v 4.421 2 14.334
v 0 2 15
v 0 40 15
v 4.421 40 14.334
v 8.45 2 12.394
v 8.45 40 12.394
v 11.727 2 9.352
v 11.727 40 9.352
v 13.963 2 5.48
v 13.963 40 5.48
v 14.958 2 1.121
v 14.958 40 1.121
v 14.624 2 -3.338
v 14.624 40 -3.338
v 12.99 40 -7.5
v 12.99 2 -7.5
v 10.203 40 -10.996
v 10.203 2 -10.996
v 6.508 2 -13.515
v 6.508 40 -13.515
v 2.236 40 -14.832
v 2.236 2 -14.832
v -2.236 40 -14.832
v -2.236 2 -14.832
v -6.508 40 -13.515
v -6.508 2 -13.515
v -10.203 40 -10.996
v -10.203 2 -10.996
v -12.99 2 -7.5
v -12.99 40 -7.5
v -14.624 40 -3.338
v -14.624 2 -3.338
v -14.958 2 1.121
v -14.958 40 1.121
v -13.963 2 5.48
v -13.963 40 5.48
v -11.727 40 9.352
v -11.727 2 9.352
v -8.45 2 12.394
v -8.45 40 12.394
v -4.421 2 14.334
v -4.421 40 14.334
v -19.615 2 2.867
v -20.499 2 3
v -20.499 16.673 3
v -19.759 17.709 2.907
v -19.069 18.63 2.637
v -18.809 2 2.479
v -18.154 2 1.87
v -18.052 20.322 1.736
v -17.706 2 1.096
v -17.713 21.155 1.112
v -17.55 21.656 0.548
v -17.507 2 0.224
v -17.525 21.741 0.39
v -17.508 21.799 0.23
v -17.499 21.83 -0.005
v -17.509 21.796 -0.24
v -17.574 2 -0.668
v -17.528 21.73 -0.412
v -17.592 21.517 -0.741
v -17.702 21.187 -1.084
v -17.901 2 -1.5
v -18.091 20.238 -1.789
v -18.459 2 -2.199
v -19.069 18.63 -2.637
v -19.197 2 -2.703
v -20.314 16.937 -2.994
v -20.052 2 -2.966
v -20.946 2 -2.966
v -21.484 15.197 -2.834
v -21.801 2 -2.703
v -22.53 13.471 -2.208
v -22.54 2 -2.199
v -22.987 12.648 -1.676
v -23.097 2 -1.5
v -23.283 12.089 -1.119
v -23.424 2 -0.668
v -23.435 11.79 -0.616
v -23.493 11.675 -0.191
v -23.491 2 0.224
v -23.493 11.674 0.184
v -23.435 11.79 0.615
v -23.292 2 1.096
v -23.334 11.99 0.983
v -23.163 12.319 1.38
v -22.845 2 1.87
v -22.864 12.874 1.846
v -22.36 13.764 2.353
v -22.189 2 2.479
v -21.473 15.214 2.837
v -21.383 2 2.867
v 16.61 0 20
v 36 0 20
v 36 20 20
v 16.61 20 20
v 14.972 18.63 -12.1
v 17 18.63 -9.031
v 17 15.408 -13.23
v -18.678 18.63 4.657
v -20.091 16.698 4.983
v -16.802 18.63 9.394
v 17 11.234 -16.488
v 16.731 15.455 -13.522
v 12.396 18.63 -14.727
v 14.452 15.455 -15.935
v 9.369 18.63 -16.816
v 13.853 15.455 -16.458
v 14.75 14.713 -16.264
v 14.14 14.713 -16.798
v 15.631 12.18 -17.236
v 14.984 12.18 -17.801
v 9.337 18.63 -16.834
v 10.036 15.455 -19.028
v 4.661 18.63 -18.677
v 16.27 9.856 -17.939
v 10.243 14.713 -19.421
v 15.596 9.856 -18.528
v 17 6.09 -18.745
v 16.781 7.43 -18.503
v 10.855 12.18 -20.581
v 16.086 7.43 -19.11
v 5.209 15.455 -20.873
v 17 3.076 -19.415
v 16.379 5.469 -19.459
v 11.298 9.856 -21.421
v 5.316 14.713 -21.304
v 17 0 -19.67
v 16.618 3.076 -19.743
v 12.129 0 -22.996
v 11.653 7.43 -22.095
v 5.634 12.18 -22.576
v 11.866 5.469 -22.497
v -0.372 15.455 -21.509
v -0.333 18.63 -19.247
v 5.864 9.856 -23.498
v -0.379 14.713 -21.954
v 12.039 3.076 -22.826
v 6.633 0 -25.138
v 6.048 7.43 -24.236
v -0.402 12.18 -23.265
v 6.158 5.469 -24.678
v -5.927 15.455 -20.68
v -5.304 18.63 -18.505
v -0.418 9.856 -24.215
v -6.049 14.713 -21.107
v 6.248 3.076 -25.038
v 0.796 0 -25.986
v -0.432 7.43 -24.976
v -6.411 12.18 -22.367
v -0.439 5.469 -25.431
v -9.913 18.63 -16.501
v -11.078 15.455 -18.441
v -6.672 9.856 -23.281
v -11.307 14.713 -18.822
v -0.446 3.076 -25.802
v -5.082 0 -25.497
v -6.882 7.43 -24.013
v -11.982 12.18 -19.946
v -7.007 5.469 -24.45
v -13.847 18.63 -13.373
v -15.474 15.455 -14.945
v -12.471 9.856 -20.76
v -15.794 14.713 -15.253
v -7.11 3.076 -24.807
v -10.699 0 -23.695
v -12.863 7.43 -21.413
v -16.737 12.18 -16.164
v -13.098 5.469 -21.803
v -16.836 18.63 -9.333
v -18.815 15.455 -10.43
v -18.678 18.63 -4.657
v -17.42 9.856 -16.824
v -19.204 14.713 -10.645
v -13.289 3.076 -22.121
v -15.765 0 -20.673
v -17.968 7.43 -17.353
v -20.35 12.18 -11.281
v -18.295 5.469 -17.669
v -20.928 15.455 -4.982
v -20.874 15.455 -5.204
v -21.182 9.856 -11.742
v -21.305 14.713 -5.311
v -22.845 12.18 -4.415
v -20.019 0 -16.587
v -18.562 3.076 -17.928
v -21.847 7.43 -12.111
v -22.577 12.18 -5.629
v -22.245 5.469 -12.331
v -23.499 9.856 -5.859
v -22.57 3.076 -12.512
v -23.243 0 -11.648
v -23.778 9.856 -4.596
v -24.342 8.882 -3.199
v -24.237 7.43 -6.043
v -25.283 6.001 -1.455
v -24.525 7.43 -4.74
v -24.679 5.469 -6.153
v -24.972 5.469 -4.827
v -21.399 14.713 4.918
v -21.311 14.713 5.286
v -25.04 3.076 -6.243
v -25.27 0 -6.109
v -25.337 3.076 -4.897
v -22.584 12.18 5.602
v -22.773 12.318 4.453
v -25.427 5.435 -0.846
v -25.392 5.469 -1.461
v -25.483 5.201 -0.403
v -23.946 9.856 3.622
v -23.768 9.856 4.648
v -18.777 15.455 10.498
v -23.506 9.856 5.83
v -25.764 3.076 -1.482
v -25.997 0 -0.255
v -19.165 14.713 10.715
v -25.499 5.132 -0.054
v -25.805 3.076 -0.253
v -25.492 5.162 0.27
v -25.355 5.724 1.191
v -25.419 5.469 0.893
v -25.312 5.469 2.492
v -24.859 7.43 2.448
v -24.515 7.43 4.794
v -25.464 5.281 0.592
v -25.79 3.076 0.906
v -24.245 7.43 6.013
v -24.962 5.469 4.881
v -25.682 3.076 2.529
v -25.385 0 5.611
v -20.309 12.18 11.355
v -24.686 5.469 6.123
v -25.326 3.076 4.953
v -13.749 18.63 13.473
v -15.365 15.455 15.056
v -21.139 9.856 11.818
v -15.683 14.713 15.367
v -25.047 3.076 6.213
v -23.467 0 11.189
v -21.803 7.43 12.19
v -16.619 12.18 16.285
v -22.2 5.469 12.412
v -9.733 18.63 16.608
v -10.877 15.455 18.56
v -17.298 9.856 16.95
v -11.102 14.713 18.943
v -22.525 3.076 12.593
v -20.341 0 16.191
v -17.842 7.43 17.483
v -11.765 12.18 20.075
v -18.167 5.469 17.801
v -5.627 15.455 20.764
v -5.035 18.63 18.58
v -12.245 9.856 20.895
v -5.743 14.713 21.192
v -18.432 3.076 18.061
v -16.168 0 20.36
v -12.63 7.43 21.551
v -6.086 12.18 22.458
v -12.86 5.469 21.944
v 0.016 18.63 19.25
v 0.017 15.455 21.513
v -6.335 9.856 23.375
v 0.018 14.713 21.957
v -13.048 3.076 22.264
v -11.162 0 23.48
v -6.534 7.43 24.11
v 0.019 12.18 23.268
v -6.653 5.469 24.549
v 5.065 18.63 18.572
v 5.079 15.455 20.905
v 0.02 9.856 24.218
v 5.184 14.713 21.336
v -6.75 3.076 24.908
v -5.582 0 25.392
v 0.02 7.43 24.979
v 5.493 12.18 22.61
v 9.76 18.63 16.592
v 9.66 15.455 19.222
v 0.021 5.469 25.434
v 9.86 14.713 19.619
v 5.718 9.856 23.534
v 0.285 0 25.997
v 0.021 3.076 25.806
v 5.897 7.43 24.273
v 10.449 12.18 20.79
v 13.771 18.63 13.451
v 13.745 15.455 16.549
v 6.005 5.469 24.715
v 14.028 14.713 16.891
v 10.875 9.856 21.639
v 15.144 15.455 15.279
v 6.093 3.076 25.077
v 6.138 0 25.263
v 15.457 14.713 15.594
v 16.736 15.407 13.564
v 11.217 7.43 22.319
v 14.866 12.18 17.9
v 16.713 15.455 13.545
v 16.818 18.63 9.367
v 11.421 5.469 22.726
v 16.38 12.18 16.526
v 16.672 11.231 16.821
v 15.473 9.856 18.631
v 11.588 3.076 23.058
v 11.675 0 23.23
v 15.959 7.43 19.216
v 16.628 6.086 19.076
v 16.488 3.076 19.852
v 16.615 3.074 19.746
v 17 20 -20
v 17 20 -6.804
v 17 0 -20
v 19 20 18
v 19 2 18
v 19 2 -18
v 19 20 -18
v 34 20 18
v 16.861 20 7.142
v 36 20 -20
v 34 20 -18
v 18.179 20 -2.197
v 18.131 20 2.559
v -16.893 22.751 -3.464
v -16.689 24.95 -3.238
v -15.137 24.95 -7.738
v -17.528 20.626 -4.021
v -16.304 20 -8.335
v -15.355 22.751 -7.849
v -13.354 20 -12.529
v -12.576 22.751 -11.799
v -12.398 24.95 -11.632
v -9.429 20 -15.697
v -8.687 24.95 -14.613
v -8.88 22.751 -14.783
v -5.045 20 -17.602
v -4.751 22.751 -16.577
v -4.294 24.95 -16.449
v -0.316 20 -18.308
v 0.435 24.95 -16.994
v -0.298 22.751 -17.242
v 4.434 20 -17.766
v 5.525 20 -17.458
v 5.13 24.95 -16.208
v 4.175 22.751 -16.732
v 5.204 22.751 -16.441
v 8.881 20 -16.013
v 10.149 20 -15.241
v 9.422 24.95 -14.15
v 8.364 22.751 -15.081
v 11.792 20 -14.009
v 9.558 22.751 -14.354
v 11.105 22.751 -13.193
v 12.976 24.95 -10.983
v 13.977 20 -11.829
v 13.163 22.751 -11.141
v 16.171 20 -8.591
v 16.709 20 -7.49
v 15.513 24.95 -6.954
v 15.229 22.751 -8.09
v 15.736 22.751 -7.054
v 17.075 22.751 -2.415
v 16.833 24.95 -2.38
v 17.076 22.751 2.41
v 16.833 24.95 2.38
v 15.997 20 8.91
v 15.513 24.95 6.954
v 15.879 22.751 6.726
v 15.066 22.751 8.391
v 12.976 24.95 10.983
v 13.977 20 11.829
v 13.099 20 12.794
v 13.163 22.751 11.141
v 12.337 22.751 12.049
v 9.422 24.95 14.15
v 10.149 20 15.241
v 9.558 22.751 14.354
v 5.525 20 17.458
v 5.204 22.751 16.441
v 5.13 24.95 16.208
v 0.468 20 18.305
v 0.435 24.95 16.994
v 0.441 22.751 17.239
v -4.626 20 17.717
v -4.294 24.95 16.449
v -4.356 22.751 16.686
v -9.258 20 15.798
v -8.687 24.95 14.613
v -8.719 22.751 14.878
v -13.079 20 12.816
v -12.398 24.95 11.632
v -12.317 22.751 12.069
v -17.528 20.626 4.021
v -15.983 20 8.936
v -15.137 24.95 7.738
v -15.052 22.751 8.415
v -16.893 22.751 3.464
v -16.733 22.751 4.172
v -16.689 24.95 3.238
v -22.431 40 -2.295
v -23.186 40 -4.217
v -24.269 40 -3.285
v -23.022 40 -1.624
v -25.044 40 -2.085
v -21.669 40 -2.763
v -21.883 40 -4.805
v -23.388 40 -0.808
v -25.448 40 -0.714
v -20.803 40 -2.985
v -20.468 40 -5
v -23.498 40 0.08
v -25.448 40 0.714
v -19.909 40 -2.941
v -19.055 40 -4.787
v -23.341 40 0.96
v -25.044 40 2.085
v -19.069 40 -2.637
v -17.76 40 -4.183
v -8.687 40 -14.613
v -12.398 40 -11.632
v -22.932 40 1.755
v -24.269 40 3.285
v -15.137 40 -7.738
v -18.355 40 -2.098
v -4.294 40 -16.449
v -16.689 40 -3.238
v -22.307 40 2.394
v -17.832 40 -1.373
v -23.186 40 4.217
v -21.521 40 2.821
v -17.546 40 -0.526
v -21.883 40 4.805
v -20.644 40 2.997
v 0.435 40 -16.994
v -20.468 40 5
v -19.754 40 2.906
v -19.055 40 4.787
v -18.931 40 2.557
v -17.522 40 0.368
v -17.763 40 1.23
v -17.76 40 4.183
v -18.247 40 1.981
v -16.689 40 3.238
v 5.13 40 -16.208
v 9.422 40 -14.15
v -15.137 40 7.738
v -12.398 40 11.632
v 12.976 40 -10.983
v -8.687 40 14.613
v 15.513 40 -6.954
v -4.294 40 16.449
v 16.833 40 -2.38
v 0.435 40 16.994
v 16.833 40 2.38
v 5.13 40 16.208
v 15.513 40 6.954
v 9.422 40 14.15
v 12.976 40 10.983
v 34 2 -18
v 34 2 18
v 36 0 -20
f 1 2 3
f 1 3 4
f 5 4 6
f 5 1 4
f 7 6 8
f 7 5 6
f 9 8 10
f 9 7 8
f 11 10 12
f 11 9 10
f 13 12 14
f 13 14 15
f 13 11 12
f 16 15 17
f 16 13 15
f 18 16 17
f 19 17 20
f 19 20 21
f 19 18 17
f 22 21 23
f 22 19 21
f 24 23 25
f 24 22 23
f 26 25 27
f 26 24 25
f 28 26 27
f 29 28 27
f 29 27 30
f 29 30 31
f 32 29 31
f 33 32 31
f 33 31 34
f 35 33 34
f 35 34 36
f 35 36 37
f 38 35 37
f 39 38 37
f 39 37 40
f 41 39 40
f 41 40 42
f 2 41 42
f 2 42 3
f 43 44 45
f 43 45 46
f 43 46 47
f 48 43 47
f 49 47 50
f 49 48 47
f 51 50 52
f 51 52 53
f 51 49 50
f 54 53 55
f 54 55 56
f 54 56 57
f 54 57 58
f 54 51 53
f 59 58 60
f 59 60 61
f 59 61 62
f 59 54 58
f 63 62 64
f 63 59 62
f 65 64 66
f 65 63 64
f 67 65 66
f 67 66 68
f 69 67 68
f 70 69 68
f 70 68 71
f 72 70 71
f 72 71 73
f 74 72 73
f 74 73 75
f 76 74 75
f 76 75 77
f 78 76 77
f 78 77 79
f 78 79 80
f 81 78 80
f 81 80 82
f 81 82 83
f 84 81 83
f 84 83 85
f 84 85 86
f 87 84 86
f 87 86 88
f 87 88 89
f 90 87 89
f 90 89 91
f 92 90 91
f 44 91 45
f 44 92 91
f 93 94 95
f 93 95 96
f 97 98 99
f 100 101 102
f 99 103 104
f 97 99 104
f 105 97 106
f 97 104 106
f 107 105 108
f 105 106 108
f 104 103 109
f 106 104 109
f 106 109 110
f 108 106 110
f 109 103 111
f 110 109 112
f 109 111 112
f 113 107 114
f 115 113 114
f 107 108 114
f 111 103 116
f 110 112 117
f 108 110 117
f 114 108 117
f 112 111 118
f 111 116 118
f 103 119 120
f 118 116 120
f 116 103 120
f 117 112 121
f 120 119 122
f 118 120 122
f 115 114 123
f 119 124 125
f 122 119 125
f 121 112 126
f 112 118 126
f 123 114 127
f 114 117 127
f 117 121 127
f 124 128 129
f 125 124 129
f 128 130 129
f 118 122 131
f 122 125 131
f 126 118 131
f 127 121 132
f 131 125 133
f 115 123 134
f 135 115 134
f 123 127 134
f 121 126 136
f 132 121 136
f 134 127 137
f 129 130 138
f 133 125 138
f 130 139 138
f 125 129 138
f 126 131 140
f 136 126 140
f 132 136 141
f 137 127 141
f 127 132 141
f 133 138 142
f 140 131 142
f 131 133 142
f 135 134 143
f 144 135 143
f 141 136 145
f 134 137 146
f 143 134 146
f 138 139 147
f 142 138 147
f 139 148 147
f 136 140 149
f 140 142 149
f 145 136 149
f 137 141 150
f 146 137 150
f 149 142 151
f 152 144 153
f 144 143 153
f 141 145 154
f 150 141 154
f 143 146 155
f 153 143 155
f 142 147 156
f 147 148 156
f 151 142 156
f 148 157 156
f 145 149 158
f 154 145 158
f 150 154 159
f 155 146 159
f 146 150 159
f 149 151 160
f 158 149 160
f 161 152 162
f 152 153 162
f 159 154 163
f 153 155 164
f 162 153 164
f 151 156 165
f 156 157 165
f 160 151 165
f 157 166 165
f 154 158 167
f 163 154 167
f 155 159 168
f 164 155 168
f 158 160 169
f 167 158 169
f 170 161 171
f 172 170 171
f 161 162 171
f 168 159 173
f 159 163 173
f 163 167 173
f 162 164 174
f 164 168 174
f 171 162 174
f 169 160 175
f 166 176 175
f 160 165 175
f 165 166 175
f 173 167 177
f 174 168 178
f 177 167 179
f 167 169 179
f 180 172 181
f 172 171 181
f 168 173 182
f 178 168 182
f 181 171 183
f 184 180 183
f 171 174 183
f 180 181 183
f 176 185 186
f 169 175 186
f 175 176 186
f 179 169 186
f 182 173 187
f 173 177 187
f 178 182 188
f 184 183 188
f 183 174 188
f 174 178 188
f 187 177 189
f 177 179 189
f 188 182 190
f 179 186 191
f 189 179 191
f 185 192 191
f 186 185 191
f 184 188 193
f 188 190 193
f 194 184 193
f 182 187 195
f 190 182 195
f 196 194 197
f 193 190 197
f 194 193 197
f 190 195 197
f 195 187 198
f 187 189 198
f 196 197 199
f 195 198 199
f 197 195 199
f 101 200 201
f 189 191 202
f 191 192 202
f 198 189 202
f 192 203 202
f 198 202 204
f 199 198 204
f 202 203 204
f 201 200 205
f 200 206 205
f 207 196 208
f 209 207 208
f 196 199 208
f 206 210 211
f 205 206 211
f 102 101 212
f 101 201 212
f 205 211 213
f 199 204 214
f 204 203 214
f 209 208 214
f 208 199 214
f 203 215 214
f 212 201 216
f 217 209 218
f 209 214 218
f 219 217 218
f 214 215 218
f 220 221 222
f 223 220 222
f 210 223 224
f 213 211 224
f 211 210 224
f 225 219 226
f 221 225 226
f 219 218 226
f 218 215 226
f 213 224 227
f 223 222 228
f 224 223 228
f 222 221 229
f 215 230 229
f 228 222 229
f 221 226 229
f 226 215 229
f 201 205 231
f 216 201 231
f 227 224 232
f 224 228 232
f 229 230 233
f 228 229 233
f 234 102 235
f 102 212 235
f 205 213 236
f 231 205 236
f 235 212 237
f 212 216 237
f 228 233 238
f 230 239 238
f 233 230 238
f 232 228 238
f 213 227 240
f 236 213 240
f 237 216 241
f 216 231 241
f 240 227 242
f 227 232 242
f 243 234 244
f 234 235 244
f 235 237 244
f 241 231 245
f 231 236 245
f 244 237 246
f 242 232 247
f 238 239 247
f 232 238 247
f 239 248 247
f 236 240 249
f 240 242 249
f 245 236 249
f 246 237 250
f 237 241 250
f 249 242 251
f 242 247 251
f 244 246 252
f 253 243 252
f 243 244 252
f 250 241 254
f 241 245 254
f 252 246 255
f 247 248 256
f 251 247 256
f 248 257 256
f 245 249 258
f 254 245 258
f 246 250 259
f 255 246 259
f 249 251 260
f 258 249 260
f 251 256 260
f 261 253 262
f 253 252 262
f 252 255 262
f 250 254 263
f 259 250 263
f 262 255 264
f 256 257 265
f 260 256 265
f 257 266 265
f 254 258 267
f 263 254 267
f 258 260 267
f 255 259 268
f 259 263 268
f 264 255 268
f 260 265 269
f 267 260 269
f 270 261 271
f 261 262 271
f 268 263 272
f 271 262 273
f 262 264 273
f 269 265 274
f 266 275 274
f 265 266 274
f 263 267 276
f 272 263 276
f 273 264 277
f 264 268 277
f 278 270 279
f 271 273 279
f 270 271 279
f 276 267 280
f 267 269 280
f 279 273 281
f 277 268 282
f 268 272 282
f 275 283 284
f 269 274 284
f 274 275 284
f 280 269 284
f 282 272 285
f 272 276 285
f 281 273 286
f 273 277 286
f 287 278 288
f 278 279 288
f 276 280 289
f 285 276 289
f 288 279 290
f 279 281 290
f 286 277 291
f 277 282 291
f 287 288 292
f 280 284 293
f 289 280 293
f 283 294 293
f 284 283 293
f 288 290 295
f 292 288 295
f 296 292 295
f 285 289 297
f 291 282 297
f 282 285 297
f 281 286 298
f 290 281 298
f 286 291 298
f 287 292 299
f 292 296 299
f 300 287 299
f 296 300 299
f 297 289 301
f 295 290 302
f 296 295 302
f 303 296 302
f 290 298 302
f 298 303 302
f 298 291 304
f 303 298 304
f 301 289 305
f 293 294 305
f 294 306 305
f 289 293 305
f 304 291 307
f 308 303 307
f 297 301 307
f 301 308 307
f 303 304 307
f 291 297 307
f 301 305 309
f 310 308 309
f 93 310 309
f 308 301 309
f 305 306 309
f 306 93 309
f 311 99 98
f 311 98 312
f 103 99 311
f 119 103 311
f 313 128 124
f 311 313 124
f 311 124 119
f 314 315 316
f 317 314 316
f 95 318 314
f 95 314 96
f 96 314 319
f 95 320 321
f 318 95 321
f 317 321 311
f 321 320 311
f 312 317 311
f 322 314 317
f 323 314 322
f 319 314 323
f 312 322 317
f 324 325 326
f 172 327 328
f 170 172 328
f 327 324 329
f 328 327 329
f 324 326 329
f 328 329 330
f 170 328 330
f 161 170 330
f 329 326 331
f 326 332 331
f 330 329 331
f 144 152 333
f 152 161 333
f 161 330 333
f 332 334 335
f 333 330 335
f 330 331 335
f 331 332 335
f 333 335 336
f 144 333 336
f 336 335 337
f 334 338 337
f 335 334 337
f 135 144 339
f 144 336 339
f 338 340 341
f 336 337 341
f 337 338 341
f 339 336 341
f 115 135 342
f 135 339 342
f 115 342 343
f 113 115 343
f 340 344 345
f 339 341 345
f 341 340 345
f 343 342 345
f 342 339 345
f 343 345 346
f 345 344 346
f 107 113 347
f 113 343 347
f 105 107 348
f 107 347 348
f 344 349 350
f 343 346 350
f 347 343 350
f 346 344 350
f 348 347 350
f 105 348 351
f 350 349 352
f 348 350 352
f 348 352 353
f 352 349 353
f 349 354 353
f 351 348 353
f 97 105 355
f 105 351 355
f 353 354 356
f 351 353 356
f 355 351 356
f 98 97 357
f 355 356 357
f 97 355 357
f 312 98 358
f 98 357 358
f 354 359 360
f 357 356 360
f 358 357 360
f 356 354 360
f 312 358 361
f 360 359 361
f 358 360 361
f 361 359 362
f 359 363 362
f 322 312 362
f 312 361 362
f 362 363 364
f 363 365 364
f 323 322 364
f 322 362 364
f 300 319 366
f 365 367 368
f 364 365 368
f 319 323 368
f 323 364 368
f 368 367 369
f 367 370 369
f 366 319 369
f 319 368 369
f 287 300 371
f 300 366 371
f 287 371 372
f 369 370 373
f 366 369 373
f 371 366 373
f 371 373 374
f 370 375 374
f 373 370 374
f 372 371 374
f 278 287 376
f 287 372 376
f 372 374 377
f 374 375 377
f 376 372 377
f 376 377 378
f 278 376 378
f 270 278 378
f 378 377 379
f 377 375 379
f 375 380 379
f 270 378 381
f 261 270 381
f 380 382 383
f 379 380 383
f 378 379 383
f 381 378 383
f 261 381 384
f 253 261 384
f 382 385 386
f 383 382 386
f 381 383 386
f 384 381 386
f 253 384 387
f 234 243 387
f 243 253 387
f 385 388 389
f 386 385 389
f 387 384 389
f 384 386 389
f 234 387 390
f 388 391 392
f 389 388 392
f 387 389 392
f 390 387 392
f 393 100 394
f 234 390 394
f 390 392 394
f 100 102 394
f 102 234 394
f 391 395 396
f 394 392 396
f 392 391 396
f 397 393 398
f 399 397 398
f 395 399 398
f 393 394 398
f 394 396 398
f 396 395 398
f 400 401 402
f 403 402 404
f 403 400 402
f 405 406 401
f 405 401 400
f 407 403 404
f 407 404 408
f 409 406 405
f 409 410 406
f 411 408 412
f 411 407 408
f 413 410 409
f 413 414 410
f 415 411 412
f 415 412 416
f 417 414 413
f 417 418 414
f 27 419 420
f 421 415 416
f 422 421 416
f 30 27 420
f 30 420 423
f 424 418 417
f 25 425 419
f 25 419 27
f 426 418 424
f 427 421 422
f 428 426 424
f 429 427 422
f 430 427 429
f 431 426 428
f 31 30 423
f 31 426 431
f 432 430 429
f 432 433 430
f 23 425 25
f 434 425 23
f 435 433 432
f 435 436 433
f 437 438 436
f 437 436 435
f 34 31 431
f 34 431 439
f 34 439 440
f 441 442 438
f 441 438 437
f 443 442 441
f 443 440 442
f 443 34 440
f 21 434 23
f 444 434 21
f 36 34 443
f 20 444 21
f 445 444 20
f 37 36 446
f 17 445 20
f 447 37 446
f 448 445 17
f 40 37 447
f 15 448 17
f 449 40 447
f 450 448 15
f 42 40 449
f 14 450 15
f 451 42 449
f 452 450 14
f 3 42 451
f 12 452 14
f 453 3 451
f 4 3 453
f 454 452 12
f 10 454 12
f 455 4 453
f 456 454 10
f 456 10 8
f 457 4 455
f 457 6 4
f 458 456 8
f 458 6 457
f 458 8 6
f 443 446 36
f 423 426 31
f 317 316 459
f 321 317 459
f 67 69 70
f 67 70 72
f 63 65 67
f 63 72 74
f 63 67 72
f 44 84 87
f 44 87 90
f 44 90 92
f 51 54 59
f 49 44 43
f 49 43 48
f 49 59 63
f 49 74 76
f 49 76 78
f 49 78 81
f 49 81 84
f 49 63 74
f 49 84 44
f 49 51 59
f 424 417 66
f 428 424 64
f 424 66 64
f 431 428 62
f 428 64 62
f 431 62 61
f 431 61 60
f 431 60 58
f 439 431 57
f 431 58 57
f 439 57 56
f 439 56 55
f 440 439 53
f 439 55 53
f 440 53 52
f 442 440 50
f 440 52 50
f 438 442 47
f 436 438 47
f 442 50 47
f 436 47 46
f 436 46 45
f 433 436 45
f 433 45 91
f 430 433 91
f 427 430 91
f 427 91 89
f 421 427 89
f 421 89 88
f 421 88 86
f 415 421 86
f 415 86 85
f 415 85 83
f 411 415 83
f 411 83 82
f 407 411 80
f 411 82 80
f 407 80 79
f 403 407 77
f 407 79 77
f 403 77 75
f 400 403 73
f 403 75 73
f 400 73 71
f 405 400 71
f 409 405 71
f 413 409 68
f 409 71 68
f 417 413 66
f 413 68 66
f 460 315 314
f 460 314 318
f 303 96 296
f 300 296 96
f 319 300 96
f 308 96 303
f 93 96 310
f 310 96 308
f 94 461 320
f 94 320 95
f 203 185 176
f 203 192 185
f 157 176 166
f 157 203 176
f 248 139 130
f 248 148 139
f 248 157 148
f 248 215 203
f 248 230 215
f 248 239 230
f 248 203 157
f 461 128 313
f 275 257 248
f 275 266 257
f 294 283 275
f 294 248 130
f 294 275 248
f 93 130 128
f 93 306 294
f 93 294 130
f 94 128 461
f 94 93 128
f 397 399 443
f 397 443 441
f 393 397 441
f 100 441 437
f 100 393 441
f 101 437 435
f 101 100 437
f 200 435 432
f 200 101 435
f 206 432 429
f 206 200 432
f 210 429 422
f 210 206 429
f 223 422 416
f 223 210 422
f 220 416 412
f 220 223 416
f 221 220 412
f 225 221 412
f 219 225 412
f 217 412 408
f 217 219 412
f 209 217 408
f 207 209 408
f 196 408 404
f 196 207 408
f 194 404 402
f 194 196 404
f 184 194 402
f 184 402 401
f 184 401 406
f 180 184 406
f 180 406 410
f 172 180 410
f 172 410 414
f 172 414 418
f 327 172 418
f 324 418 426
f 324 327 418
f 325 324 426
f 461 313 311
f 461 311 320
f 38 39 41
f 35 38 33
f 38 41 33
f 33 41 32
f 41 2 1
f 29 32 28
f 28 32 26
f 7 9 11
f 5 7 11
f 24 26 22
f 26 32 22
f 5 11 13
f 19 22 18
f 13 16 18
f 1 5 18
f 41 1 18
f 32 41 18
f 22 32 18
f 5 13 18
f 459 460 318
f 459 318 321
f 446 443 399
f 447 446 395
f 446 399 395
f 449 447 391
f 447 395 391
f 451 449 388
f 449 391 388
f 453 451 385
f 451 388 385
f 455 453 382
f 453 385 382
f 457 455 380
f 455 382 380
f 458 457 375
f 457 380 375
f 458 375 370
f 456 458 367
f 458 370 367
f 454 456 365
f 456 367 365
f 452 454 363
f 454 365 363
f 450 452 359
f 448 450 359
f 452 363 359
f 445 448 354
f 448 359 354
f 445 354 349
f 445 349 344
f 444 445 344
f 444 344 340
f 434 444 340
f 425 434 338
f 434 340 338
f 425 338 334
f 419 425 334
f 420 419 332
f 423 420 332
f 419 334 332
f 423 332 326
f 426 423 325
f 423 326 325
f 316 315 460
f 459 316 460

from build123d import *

# Parameters (mm, degrees)
SKETCH1_R               = 17
SKETCH1_R_2             = 15
BOSS_EXTRUDE1_DEPTH     = 40
SKETCH2_R               = 26
SKETCH2_R_2             = 15
BOSS_EXTRUDE2_DEPTH     = 15
FILLET1_R               = 10
BOSS_EXTRUDE4_REACH     = 56.331
SKETCH3_R               = 5
SKETCH3_R_2             = 3
CUT_EXTRUDE1_START      = -38
SKETCH4_R               = 3
CUT_EXTRUDE1_DEPTH      = 38
SKETCH5_R               = 15
BOSS_EXTRUDE5_DEPTH     = 2
BOSS_EXTRUDE10_START    = -40
SKETCH13_W              = 15
SKETCH13_H              = 36
BOSS_EXTRUDE10_DEPTH    = 20
CUT_EXTRUDE4_DEPTH      = 49.702222157
CUT_EXTRUDE4_DEPTH_BACK = 49.702222157
SKETCH14_W              = 15
SKETCH14_H              = 36
SKETCH15_W              = 15
SKETCH15_H              = 36
BOSS_EXTRUDE11_DEPTH    = 2


with BuildPart() as part:
    # Sketch1 → Boss-Extrude1 (new body)
    with BuildSketch(Plane(origin=(0, 0, 0), x_dir=(1, 0, 0), z_dir=(0, 1, 0))):
        with Locations(Location((0, 0, 0), (0, 0, 270))):
            Circle(SKETCH1_R)
        with Locations(Location((0, 0, 0), (0, 0, 270))):
            Circle(SKETCH1_R_2, mode=Mode.SUBTRACT)
    extrude(amount=BOSS_EXTRUDE1_DEPTH)

    # Sketch2 → Boss-Extrude2 (add)
    with BuildSketch(Plane.XZ):
        with Locations(Location((0, 0, 0), (0, 0, 270))):
            Circle(SKETCH2_R)
        with Locations(Location((0, 0, 0), (0, 0, 90))):
            Circle(SKETCH2_R_2, mode=Mode.SUBTRACT)
    extrude(amount=-BOSS_EXTRUDE2_DEPTH)

    # Fillet1
    # the kernel refuses this fillet: 10 mm, written as the material it adds along each edge
    with BuildSketch(Plane(origin=(0, 15, 0), x_dir=(0, 0, 1), z_dir=(1, 0, 0))) as fillet1_piece_1:
        with BuildLine():
            CenterArc((27, -9.949874371), FILLET1_R, 95.739170477, 84.260829523)
            Line((17, -9.949874371), (16.8, -9.949874371))
            Line((16.8, -9.949874371), (16.8, 0))
            Line((16.8, 0), (17, 0.2))
            ThreePointArc((17, 0.2), (21.5, 0.2), (25.98, 0.198997487))
            Line((25.98, 0.198997487), (26, 0))
        make_face()
    revolve(axis=Axis((0, 15, 0), (0, -1, 0)))

    # Fillet2: read off the stored shape, not the designer's step
    # Fillet2 outline → Fillet2 (revolve, cut)
    with BuildSketch(Plane.XY):
        with BuildLine():
            Line((25.998200588, 18.630262041), (19.25, 18.630262041))
            ThreePointArc((19.25, 18.630262041), (24.206637205, 9.888353044), (25.998200588, 0))
            Line((25.998200588, 0), (25.998200588, 18.630262041))
        make_face()
    revolve(axis=Axis((0, 0, 0), (0, 1, 0)), mode=Mode.SUBTRACT)

    # Fillet2 2 outline → Fillet2 2 (revolve, cut)
    with BuildSketch(Plane.XY):
        with BuildLine():
            Line((26, 0), (26, 15))
            ThreePointArc((26, 15), (25.999100287, 15.000090466), (25.998200582, 15.000181013))
            Line((25.998200582, 15.000181013), (25.998200588, 0))
            Line((25.998200588, 0), (26, 0))
        make_face()
    revolve(axis=Axis((0, 0, 0), (0, 1, 0)), mode=Mode.SUBTRACT)

    # Boss-Extrude4: up to this face of the body (flat: up to its plane)
    boss_extrude4_end = Plane(part.part.faces().sort_by_distance((0, 40, -16.519167389))[0])
    # Sketch3 → Boss-Extrude4 (add, up to the picked face)
    with BuildSketch(Plane.XZ, mode=Mode.PRIVATE) as boss_extrude4_sk1:
        with Locations((-20.499100294, 0)):
            Circle(SKETCH3_R)
        with Locations(Location((-20.499100294, 0, 0), (0, 0, 298.480209609))):
            Circle(SKETCH3_R_2, mode=Mode.SUBTRACT)
    boss_extrude4_tool1 = split(extrude(boss_extrude4_sk1.sketch, amount=-BOSS_EXTRUDE4_REACH, mode=Mode.PRIVATE), bisect_by=boss_extrude4_end, keep=Keep.BOTH, mode=Mode.PRIVATE)
    add(boss_extrude4_tool1.solids().sort_by(Axis((-25.357679, 0, 0), (0, 1, 0)))[0])

    # Sketch4 → Cut-Extrude1 (cut)
    with BuildSketch(Plane(origin=(0, 40, 0), x_dir=(1, 0, 0), z_dir=(0, 1, 0)).offset(CUT_EXTRUDE1_START)):
        with Locations(Location((-20.499100294, 0, 0), (0, 0, 270))):
            Circle(SKETCH4_R)
    extrude(amount=CUT_EXTRUDE1_DEPTH, mode=Mode.SUBTRACT)

    # Sketch5 → Boss-Extrude5 (add)
    with BuildSketch(Plane.XZ):
        with Locations(Location((0, 0, 0), (0, 0, 270))):
            Circle(SKETCH5_R)
    extrude(amount=-BOSS_EXTRUDE5_DEPTH)

    # Sketch13 → Boss-Extrude10 (add)
    with BuildSketch(Plane(origin=(0, 40, 0), x_dir=(1, 0, 0), z_dir=(0, 1, 0)).offset(BOSS_EXTRUDE10_START)):
        Polygon((17, 0), (17, 20), (36, 20), (36, -20), (16.610431475, -20), align=None)
        with Locations((26.5, 0)):
            Rectangle(SKETCH13_W, SKETCH13_H, mode=Mode.SUBTRACT)
    extrude(amount=BOSS_EXTRUDE10_DEPTH)

    # Sketch14 → Cut-Extrude4 (cut, two sides: drawn at the far end of the back side and taken through both)
    with BuildSketch(Plane(origin=(0, 20, 0), x_dir=(1, 0, 0), z_dir=(0, 1, 0)).offset(-CUT_EXTRUDE4_DEPTH_BACK)):
        with Locations((26.5, 0)):
            Rectangle(SKETCH14_W, SKETCH14_H)
    extrude(amount=CUT_EXTRUDE4_DEPTH + CUT_EXTRUDE4_DEPTH_BACK, mode=Mode.SUBTRACT)

    # Sketch15 → Boss-Extrude11 (add)
    with BuildSketch(Plane.XZ):
        with Locations((26.5, 0)):
            Rectangle(SKETCH15_W, SKETCH15_H)
    extrude(amount=-BOSS_EXTRUDE11_DEPTH)


solid = part.part
